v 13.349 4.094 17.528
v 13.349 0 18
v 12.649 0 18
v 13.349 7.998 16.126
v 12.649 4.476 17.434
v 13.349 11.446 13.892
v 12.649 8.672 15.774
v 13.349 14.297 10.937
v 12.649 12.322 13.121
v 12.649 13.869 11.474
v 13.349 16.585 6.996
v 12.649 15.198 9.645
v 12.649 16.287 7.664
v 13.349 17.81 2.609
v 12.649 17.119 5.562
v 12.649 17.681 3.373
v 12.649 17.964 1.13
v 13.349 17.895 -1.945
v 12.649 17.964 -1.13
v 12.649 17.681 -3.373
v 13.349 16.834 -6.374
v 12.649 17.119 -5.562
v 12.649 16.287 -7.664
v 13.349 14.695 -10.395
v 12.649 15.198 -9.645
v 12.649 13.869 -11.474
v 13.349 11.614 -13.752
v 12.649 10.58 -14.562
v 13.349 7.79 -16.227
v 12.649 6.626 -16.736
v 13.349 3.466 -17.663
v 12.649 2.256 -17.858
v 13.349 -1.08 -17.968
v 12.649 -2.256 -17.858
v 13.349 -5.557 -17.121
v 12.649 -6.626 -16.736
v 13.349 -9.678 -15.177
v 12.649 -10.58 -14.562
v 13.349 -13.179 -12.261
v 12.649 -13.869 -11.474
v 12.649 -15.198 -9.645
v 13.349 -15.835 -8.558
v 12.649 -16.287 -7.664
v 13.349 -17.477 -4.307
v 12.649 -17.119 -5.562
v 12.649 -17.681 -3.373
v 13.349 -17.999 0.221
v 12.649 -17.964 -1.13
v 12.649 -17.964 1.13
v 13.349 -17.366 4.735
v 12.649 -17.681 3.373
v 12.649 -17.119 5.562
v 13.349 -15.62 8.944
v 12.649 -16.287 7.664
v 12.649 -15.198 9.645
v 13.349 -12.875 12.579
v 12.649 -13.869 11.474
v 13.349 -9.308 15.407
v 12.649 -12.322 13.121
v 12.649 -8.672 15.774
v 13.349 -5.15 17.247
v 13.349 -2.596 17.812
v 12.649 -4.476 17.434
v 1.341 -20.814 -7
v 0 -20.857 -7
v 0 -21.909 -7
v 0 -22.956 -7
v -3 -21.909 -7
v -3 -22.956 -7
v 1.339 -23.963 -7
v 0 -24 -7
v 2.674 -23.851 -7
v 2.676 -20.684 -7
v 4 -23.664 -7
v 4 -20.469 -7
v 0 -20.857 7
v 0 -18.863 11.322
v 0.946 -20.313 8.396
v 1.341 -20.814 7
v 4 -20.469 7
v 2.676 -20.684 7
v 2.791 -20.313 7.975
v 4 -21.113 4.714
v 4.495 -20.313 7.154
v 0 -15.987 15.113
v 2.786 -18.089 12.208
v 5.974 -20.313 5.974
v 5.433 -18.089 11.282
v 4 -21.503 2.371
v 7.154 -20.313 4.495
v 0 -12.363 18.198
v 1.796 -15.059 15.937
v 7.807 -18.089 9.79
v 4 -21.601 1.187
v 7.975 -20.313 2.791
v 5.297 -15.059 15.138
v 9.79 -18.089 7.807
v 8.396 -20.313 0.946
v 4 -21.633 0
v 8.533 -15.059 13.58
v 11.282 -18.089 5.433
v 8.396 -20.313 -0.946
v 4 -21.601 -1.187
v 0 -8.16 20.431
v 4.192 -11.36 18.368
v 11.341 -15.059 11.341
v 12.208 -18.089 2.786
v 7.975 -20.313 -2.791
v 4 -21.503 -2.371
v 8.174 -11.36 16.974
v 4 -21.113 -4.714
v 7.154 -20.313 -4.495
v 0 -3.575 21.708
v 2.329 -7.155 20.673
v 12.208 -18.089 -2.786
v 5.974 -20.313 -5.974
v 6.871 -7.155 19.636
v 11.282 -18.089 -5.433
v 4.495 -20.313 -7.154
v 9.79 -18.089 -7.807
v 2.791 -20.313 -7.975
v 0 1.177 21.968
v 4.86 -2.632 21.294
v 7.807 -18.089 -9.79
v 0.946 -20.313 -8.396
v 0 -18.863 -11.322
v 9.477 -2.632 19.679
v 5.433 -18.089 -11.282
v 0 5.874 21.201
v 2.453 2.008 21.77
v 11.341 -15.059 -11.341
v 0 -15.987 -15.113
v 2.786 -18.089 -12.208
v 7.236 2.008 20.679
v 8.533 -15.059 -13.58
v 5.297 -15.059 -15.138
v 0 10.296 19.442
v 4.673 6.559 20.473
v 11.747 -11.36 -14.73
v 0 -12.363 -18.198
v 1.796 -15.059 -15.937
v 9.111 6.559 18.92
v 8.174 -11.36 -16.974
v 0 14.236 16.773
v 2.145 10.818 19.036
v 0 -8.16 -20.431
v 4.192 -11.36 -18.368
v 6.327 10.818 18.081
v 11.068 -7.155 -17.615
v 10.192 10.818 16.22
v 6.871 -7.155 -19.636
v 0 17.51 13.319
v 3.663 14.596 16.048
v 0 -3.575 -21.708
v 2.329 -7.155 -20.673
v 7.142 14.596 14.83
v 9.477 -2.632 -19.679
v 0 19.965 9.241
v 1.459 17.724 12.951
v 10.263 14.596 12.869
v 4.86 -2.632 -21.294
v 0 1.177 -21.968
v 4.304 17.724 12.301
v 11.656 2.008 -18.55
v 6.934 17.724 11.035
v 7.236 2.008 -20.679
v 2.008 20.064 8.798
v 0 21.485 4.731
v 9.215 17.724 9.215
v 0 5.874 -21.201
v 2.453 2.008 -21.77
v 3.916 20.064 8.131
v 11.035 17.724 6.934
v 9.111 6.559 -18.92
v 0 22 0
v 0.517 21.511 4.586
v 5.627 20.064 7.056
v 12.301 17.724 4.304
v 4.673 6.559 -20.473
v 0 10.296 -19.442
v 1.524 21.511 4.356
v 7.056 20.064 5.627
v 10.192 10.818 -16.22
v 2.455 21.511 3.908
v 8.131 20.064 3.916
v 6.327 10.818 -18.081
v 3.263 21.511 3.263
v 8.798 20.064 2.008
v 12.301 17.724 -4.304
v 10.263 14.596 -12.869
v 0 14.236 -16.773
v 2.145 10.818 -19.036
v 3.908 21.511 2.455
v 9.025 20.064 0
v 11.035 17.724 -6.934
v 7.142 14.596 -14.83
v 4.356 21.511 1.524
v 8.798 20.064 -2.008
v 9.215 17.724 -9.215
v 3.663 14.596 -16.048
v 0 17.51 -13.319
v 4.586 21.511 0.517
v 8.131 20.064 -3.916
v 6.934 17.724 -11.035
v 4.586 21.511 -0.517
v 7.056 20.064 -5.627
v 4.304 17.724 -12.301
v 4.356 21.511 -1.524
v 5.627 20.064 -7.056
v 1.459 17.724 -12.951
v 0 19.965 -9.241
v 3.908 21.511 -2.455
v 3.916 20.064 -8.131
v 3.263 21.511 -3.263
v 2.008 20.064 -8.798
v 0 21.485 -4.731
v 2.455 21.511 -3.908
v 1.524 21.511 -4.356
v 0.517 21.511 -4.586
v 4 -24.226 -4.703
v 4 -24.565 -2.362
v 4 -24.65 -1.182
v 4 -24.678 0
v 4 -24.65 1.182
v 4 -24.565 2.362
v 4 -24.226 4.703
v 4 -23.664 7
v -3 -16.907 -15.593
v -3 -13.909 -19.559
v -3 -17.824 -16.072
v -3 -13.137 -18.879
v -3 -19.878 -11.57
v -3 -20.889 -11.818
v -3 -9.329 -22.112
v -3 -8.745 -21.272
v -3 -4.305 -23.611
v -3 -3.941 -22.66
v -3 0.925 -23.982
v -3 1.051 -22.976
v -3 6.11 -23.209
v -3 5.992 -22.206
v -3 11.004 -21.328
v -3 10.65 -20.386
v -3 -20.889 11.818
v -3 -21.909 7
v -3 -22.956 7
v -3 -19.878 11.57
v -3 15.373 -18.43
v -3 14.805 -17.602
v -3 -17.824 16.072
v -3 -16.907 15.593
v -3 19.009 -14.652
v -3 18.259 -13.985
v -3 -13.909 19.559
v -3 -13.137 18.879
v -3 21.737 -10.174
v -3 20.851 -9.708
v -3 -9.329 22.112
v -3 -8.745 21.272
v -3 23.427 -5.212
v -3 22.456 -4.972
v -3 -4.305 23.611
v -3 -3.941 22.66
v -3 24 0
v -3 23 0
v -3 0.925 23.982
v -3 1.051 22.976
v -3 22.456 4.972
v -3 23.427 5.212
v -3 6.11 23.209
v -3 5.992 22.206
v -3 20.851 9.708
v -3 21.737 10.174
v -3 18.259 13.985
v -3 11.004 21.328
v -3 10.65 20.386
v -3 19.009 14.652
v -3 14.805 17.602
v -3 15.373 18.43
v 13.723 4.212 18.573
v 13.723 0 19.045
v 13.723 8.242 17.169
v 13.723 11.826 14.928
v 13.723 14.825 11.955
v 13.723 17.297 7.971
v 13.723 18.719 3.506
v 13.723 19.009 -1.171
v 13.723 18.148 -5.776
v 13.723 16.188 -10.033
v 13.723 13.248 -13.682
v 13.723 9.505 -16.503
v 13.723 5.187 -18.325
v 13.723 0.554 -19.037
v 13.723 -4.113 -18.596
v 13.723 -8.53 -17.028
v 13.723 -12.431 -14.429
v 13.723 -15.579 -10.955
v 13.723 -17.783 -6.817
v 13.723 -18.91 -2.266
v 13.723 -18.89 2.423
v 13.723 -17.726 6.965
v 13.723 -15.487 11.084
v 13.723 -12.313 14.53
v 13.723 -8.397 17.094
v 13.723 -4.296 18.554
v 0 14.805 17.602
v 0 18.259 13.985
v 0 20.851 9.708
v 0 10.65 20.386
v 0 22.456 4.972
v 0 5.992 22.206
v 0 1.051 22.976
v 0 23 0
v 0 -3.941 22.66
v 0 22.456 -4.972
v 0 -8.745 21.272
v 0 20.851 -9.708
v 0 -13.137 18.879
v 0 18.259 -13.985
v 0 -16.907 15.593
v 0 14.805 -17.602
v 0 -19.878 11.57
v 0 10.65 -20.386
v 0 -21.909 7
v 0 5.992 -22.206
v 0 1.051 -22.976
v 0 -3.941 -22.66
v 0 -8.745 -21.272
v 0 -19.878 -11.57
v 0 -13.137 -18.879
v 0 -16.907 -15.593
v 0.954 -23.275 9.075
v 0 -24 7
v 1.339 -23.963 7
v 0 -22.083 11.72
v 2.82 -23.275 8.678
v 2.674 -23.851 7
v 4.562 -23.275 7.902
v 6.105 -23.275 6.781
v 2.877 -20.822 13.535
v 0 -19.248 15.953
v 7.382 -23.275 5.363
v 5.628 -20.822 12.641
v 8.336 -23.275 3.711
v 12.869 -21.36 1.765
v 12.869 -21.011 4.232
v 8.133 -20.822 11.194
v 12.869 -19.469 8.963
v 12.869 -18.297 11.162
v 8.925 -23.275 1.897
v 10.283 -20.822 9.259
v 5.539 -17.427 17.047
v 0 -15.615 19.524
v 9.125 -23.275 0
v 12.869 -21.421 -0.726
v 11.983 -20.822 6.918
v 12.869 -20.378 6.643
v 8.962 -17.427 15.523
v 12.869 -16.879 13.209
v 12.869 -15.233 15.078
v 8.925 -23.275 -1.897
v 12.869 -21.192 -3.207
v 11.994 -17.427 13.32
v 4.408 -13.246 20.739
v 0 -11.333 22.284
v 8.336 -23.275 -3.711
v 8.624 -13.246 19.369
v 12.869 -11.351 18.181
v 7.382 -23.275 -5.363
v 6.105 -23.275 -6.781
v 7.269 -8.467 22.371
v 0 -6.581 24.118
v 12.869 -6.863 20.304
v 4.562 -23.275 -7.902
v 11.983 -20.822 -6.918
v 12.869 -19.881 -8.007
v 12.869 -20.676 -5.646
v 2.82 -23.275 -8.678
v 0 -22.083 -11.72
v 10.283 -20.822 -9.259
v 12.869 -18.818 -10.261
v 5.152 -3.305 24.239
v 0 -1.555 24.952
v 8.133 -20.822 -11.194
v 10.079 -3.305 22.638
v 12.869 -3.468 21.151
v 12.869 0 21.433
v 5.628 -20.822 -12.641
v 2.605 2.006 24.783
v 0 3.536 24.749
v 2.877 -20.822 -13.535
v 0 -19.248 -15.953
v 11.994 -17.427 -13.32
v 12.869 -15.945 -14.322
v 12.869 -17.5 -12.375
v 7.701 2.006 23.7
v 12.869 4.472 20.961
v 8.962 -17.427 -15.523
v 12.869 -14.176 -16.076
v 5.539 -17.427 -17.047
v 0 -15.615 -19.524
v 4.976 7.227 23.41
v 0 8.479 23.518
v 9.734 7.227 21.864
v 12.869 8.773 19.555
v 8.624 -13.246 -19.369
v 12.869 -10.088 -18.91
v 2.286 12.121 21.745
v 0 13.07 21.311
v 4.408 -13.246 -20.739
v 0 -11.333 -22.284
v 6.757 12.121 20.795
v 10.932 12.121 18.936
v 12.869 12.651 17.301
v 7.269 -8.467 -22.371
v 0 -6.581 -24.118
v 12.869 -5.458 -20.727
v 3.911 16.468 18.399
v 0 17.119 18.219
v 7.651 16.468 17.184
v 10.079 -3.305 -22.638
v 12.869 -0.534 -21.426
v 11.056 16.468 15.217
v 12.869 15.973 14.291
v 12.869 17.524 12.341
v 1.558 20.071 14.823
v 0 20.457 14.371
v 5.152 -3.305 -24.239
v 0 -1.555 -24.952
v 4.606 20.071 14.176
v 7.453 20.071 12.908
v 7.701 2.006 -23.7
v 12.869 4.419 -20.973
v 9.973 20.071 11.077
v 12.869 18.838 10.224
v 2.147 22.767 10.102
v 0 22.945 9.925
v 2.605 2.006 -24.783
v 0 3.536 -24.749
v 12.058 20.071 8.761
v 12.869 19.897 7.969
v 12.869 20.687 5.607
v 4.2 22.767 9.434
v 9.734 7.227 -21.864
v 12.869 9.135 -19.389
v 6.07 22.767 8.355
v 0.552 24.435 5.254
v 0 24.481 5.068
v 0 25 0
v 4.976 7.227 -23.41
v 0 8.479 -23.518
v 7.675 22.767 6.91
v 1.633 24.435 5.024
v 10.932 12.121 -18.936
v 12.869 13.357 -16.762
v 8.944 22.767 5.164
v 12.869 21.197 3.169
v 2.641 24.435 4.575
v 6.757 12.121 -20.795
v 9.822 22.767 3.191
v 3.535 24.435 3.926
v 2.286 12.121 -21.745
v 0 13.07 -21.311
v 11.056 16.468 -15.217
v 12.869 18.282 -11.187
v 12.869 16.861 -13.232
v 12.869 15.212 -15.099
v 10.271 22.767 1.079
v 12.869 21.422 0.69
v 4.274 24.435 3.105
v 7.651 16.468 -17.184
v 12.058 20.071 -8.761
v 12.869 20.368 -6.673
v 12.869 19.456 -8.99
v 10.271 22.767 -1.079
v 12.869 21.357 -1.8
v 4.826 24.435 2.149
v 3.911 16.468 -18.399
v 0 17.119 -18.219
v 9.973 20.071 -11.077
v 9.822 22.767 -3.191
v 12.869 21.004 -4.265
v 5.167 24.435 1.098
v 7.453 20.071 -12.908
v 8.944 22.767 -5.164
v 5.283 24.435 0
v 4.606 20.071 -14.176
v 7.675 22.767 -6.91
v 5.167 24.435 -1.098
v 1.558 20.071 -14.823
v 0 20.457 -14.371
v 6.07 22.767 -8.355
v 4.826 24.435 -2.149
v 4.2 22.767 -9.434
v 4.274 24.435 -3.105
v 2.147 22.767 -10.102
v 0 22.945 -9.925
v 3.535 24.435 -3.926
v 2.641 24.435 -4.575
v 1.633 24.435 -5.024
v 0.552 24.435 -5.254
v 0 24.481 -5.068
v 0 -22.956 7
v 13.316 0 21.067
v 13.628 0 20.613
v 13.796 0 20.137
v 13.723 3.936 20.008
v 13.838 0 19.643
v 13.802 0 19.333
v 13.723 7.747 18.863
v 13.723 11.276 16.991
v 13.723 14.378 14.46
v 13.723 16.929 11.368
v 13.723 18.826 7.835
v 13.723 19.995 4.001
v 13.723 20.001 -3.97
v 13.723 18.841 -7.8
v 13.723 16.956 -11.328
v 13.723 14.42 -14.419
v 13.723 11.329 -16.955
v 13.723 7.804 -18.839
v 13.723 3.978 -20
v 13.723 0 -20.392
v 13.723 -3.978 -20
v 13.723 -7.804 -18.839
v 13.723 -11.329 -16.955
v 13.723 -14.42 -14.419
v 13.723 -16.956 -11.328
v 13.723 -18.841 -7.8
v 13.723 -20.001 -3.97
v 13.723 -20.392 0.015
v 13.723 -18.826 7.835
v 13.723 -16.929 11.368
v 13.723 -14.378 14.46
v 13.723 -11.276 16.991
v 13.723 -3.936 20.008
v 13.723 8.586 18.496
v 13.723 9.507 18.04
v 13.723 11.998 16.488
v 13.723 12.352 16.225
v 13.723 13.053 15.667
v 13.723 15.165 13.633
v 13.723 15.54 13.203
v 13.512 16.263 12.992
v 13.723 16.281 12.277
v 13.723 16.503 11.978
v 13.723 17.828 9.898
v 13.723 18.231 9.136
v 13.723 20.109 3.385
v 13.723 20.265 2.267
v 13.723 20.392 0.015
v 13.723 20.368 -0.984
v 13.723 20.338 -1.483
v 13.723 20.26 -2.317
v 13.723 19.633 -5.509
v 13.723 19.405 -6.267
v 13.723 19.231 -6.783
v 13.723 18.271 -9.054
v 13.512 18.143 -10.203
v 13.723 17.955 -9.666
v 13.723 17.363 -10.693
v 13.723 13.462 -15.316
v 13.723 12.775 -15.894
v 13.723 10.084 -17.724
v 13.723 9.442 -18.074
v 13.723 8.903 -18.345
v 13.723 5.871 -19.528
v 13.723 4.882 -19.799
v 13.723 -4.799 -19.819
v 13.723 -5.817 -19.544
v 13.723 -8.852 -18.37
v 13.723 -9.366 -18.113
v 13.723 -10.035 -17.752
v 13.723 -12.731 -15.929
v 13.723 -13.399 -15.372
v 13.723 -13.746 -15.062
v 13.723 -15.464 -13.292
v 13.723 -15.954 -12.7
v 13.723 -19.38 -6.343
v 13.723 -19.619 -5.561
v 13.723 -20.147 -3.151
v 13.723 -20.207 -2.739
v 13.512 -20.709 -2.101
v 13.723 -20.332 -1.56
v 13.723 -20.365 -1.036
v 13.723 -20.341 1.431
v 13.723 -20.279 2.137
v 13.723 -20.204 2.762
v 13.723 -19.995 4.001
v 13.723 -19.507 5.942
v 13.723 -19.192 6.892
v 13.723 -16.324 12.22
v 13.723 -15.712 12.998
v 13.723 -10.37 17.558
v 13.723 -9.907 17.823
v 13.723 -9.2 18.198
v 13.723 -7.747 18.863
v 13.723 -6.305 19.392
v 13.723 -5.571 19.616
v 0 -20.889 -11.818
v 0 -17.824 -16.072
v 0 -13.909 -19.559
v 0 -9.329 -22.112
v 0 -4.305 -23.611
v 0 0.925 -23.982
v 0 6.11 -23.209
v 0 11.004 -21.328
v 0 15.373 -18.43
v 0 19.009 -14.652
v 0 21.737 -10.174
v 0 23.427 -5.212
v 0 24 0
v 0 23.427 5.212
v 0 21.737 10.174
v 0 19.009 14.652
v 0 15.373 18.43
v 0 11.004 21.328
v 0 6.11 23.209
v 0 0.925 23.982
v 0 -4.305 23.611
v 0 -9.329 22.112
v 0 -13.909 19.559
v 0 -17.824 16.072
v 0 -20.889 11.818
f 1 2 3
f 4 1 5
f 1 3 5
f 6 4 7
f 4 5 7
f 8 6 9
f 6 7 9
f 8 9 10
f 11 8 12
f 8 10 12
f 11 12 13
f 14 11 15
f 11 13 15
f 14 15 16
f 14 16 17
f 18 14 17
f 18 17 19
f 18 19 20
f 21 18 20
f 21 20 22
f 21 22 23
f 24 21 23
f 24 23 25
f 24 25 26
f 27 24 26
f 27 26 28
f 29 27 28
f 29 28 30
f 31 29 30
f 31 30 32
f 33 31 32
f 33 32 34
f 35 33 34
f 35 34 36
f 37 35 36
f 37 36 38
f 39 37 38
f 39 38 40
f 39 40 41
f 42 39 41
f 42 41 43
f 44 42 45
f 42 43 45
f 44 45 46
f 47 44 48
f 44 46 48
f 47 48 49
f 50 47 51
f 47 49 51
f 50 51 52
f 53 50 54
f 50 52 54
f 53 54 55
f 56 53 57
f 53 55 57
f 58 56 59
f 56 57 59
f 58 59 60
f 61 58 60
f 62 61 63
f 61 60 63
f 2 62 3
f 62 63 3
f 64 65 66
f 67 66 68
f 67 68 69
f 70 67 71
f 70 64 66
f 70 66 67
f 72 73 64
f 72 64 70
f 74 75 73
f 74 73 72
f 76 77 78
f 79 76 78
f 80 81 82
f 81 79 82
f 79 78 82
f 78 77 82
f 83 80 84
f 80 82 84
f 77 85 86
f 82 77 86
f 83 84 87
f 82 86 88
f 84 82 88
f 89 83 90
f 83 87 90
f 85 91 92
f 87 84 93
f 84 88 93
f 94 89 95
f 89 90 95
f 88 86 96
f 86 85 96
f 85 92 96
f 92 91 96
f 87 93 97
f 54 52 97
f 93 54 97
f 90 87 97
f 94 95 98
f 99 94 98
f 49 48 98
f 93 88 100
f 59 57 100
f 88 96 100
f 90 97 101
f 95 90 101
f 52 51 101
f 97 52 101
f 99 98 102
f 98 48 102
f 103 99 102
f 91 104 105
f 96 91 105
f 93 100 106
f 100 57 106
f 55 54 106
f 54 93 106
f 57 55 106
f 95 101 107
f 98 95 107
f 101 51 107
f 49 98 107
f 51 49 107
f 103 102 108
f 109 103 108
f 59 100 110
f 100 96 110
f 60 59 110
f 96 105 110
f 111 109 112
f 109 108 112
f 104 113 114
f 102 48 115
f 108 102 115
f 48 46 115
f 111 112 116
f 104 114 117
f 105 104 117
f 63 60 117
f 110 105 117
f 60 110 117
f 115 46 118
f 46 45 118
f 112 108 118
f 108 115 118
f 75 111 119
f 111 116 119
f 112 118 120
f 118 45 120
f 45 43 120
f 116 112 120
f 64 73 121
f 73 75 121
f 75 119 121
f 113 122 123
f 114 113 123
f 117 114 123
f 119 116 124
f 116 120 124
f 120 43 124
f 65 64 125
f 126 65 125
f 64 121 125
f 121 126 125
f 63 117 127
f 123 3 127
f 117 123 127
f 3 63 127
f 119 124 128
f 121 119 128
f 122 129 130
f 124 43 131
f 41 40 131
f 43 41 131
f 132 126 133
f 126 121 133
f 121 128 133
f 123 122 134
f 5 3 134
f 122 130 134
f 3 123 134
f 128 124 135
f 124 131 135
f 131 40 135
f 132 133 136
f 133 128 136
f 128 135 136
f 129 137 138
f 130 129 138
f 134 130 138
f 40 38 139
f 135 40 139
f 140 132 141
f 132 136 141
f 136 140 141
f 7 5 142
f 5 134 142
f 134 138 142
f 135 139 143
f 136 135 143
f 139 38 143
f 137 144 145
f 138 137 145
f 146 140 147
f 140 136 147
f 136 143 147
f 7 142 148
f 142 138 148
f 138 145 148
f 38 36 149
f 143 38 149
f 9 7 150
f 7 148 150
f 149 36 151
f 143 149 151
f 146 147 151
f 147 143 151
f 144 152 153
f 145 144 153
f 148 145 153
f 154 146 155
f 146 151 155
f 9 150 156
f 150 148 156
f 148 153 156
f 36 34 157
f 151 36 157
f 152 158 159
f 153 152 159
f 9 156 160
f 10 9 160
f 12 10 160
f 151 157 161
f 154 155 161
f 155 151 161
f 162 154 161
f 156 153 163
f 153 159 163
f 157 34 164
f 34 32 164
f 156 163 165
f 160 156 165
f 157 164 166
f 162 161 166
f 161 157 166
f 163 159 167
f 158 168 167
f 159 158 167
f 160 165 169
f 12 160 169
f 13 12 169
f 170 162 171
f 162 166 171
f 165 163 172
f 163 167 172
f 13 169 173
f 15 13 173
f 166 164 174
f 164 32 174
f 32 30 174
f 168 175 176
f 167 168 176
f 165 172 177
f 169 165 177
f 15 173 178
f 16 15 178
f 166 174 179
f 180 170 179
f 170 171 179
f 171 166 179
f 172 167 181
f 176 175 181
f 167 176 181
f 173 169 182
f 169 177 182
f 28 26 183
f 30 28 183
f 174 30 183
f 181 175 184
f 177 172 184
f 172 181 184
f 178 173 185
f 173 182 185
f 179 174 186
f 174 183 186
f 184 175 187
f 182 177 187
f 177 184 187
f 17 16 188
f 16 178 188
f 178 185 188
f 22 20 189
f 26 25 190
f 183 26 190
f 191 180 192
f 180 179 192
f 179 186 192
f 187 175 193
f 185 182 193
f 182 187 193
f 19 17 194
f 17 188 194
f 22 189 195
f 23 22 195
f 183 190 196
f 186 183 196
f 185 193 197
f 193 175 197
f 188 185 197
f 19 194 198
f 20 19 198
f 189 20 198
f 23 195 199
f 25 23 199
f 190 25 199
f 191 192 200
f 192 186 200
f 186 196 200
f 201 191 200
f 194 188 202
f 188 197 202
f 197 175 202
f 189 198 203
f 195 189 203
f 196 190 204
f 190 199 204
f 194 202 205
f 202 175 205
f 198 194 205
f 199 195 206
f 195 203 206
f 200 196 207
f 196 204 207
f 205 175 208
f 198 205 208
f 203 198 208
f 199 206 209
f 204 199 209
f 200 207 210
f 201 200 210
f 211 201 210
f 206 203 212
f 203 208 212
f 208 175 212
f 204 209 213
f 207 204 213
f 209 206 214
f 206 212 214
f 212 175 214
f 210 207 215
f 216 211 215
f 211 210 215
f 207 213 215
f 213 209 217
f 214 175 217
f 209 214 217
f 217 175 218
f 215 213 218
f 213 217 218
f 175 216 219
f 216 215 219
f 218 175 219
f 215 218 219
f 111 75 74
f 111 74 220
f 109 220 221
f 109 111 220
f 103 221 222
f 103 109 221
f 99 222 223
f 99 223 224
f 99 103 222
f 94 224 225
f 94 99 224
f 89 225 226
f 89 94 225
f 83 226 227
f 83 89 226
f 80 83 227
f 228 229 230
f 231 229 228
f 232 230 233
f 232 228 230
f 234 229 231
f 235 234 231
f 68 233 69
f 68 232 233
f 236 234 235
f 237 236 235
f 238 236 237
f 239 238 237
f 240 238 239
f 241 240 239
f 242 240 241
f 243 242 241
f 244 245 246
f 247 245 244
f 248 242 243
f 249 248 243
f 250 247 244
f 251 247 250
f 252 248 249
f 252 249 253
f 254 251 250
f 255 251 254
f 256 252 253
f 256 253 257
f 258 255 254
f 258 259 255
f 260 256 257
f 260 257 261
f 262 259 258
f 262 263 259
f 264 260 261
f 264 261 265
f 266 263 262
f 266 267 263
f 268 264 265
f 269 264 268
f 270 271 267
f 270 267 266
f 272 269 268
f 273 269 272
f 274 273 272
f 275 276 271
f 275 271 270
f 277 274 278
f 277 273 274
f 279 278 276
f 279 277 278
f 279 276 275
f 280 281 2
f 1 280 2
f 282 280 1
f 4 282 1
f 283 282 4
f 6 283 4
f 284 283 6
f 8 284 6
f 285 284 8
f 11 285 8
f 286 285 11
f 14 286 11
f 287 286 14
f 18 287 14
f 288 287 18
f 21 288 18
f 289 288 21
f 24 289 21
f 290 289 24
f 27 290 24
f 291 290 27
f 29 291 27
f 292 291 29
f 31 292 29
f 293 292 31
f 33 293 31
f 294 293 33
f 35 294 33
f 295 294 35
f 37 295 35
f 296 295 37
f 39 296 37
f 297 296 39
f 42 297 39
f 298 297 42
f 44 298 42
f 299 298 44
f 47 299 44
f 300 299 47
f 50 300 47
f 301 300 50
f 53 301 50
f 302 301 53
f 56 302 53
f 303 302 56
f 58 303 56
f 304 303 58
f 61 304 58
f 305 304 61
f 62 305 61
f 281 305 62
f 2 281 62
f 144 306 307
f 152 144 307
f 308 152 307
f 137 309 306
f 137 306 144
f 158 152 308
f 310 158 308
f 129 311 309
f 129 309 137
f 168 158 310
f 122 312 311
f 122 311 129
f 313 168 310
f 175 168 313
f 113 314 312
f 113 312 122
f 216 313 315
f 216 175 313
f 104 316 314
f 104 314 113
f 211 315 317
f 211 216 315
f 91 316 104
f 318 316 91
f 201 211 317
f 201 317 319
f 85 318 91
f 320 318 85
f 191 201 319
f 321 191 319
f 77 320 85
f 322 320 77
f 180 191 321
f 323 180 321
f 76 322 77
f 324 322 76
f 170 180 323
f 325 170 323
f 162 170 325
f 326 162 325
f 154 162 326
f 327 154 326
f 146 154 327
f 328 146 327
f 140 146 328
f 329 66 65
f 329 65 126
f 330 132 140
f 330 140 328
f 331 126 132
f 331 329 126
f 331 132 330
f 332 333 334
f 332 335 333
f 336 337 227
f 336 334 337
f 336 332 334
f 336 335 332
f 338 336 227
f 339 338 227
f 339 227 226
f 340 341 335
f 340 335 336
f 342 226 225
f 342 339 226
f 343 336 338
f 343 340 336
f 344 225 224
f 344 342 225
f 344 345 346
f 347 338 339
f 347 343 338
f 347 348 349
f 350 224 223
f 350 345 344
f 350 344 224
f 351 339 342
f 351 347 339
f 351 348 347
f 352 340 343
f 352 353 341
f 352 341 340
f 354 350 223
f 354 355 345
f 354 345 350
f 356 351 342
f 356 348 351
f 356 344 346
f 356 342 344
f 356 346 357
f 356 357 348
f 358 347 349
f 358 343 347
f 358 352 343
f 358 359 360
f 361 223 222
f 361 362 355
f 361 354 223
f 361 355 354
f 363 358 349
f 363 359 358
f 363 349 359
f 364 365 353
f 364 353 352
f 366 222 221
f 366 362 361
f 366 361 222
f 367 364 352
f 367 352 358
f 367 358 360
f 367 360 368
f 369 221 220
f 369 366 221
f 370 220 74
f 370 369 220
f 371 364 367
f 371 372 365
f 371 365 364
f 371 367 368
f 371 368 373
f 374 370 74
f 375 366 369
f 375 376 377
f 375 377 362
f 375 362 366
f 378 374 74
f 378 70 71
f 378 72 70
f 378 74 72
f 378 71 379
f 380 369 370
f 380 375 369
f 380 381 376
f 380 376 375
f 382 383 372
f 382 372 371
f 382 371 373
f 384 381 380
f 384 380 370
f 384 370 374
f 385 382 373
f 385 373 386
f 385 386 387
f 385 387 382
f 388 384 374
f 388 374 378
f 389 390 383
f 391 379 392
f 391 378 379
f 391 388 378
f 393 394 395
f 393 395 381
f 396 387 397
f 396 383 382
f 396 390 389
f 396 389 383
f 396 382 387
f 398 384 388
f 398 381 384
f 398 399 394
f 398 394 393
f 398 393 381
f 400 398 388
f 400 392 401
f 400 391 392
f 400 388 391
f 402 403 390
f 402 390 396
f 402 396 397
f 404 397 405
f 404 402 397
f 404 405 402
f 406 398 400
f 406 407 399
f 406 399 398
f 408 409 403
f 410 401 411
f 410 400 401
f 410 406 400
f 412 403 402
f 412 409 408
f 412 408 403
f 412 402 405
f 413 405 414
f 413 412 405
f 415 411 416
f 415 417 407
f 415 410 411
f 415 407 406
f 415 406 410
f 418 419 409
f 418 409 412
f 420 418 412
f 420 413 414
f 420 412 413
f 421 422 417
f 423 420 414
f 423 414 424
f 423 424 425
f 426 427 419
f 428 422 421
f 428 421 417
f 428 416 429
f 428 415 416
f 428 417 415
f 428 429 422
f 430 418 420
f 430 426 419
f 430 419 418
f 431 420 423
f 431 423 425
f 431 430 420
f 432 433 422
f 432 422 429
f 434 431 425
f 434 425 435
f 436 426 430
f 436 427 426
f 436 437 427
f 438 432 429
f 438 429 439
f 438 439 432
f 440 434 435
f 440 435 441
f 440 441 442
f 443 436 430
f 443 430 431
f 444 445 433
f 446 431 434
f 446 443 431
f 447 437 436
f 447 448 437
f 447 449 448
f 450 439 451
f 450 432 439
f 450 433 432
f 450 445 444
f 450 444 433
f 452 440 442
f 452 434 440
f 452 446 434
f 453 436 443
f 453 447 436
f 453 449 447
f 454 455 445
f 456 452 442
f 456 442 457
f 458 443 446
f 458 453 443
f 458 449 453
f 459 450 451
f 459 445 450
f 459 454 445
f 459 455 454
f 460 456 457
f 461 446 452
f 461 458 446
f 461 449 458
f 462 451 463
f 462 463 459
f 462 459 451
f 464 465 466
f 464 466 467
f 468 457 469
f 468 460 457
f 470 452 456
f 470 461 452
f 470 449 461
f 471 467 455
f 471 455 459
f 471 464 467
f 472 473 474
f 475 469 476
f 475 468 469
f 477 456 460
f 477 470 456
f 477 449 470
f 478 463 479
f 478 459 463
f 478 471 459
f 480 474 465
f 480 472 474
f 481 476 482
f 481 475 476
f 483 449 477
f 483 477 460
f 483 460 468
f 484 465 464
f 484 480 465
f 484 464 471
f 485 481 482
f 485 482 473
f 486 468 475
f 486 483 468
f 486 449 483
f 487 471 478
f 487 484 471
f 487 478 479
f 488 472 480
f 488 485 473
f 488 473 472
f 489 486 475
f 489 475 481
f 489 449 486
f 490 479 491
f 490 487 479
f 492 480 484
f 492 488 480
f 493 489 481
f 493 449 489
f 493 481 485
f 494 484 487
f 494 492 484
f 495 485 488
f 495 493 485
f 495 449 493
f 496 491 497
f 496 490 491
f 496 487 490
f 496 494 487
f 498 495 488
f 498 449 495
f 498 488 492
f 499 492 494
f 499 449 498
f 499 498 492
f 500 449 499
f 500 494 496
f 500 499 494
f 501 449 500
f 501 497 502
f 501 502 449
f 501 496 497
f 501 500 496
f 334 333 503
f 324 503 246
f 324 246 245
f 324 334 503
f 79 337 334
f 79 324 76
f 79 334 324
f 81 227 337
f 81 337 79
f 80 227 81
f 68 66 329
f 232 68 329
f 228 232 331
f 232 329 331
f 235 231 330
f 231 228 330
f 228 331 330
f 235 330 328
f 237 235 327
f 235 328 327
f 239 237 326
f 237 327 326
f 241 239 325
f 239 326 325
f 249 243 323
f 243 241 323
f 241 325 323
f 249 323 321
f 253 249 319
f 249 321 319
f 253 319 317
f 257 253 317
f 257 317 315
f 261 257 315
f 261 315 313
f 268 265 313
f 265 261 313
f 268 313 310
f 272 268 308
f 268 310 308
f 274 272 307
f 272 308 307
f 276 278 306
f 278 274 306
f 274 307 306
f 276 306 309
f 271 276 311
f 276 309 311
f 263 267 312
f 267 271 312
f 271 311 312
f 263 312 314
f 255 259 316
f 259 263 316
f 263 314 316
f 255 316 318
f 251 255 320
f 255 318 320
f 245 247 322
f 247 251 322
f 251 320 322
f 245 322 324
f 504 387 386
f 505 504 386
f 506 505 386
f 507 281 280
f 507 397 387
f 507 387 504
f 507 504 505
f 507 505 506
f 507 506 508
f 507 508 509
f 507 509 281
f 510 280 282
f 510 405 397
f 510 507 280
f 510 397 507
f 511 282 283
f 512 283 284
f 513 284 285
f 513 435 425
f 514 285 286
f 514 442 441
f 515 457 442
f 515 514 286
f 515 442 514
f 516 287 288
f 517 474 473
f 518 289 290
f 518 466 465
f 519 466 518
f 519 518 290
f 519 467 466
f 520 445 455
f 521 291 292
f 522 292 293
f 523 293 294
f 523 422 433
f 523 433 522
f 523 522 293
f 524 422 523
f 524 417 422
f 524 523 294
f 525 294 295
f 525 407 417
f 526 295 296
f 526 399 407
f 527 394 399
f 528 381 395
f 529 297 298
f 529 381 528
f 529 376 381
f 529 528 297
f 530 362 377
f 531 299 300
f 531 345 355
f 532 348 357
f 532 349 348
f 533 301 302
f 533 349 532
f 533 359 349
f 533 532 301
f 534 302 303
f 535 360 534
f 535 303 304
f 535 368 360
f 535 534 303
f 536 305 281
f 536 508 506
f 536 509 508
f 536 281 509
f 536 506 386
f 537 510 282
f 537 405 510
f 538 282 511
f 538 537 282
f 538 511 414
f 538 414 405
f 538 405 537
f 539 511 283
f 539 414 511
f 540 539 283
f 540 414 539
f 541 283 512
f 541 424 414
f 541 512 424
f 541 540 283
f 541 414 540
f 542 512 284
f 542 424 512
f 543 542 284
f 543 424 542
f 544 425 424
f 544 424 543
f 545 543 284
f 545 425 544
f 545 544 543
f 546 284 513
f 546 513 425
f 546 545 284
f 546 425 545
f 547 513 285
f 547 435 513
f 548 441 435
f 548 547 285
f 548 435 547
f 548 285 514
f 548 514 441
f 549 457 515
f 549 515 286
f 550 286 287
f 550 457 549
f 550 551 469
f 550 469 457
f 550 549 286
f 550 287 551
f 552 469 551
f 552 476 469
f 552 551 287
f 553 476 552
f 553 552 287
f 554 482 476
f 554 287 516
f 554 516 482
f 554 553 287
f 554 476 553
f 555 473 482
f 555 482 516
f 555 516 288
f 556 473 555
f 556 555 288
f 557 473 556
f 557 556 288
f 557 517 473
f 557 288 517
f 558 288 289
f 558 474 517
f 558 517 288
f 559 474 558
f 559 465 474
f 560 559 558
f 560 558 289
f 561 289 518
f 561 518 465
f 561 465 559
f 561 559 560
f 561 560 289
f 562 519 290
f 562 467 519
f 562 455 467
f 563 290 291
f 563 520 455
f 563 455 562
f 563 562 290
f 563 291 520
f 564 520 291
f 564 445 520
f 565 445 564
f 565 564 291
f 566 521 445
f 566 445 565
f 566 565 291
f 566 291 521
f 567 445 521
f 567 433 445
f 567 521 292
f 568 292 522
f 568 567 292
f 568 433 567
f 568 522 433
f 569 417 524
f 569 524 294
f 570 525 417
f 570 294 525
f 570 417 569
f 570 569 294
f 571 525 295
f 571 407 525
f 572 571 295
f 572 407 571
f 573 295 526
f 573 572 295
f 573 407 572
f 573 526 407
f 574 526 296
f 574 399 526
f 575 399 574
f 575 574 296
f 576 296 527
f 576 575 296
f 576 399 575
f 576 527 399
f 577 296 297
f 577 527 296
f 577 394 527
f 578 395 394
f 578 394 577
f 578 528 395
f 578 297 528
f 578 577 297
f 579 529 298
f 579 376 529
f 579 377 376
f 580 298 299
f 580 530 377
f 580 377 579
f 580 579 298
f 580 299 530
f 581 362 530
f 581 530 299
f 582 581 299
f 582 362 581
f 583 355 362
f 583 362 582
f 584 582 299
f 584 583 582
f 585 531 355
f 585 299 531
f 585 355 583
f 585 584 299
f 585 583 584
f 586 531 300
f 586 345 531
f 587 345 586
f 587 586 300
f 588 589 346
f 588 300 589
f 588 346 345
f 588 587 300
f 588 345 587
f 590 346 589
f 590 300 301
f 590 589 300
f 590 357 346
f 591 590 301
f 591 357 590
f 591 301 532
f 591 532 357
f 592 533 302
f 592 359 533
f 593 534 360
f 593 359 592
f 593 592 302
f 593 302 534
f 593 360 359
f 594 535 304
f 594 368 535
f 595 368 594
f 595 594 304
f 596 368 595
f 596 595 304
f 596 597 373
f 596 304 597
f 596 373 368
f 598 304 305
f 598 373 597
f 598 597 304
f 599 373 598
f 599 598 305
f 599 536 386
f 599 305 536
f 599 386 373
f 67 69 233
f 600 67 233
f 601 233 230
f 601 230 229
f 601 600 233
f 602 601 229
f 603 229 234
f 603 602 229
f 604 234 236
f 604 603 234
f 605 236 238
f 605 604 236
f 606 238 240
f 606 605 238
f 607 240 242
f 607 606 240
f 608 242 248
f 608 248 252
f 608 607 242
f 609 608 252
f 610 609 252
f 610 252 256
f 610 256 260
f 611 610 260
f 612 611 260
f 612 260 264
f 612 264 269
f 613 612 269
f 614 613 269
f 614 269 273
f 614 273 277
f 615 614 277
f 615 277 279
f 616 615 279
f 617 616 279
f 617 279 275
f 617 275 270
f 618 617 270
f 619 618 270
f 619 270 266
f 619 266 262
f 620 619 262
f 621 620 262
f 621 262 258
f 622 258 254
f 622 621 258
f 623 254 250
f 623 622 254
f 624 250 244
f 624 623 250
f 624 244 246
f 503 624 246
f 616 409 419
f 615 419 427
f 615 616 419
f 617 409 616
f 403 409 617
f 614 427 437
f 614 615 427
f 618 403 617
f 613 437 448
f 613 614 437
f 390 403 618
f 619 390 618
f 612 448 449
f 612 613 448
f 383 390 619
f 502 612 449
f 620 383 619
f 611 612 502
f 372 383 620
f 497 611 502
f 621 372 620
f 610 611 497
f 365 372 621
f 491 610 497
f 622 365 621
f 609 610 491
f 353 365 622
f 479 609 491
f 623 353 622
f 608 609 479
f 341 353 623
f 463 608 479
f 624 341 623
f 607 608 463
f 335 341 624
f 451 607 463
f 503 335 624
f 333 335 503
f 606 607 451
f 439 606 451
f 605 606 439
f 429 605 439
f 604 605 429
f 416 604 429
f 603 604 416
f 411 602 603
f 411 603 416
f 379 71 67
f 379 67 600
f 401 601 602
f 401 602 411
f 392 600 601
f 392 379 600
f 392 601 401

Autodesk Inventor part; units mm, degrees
ref_plane "YZ Plane" through (0, 0, 0) normal (1, 0, 0) x (0, 1, 0)
ref_plane "XZ Plane" through (0, 0, 0) normal (0, 1, 0) x (-1, 0, 0)
ref_plane "XY Plane" through (0, 0, 0) normal (0, 0, 1) x (1, 0, 0)
sketch "Sketch1" plane through (0, 0, 0) normal (1, 0, 0) x (0, 1, 0)
  circle A0 centre (0, 0) radius 25
  circle A1 centre (0, 0) radius 22
  line L0 (25, 0) -> (-25, 0)
  point P0 (-22, 0)
  point P1 (22, 0)
  dimension "d0" = 50
  dimension "d1" = 3
revolve "Revolution1" add sketch "Sketch1" angle 360 about axis through (0, 25, 0) along (0, -1, 0) picked at (23.7578, -1.9943) contours A0 L0 A1
split "Split1" plane through (0, 0, 0) removes the side toward (-1, 0, 0)
sketch "Sketch8" plane through (0, 0, 0) normal (-1, 0, 0) x (0, 0, 1)
  circle A0 centre (0, 0) radius 18
  dimension "d40" = 36
extrude "Extrusion7" cut sketch "Sketch8" against normal blind 39
chamfer "Chamfer1" distance 4 angle 45 1 edges at (17.3494, -0.0007, -18)
sketch "Sketch9" plane through (0, 0, 0) normal (-1, 0, 0) x (0, 0, 1)
  circle A0 centre (0, 0) radius 24
  circle A1 centre (0, 0) radius 23
  dimension "d46" = 48
  dimension "d47" = 1
extrude "Extrusion8" add sketch "Sketch9" along normal blind 3
sketch "Sketch10" plane through (0, 0, 0) normal (-1, 0, 0) x (0, 0, 1)
  line L0 (0, 0) -> (0, -25)
  circle A0 centre (0, 0) radius 25
  line L1 (7, -17.5) -> (-7, -17.5)
  line L2 (-7, -17.5) -> (-7, -32.5)
  line L3 (-7, -32.5) -> (7, -32.5)
  line L4 (7, -32.5) -> (7, -17.5)
  line L5 (7, -17.5) -> (-7, -32.5) construction
  line L6 (-7, -17.5) -> (7, -32.5) construction
  dimension "d50" = 14
  dimension "d51" = 15
extrude "Extrusion9" cut sketch "Sketch10" along normal mid plane 8 contours L1 L4 A0 L0 | L0 A0 L2 L1 | A0 L4 L3 L2
fillet "Fillet1" radius 2 1 edges at (14.2565, -0.0008, -20.5366)
properties part number "cover2"
